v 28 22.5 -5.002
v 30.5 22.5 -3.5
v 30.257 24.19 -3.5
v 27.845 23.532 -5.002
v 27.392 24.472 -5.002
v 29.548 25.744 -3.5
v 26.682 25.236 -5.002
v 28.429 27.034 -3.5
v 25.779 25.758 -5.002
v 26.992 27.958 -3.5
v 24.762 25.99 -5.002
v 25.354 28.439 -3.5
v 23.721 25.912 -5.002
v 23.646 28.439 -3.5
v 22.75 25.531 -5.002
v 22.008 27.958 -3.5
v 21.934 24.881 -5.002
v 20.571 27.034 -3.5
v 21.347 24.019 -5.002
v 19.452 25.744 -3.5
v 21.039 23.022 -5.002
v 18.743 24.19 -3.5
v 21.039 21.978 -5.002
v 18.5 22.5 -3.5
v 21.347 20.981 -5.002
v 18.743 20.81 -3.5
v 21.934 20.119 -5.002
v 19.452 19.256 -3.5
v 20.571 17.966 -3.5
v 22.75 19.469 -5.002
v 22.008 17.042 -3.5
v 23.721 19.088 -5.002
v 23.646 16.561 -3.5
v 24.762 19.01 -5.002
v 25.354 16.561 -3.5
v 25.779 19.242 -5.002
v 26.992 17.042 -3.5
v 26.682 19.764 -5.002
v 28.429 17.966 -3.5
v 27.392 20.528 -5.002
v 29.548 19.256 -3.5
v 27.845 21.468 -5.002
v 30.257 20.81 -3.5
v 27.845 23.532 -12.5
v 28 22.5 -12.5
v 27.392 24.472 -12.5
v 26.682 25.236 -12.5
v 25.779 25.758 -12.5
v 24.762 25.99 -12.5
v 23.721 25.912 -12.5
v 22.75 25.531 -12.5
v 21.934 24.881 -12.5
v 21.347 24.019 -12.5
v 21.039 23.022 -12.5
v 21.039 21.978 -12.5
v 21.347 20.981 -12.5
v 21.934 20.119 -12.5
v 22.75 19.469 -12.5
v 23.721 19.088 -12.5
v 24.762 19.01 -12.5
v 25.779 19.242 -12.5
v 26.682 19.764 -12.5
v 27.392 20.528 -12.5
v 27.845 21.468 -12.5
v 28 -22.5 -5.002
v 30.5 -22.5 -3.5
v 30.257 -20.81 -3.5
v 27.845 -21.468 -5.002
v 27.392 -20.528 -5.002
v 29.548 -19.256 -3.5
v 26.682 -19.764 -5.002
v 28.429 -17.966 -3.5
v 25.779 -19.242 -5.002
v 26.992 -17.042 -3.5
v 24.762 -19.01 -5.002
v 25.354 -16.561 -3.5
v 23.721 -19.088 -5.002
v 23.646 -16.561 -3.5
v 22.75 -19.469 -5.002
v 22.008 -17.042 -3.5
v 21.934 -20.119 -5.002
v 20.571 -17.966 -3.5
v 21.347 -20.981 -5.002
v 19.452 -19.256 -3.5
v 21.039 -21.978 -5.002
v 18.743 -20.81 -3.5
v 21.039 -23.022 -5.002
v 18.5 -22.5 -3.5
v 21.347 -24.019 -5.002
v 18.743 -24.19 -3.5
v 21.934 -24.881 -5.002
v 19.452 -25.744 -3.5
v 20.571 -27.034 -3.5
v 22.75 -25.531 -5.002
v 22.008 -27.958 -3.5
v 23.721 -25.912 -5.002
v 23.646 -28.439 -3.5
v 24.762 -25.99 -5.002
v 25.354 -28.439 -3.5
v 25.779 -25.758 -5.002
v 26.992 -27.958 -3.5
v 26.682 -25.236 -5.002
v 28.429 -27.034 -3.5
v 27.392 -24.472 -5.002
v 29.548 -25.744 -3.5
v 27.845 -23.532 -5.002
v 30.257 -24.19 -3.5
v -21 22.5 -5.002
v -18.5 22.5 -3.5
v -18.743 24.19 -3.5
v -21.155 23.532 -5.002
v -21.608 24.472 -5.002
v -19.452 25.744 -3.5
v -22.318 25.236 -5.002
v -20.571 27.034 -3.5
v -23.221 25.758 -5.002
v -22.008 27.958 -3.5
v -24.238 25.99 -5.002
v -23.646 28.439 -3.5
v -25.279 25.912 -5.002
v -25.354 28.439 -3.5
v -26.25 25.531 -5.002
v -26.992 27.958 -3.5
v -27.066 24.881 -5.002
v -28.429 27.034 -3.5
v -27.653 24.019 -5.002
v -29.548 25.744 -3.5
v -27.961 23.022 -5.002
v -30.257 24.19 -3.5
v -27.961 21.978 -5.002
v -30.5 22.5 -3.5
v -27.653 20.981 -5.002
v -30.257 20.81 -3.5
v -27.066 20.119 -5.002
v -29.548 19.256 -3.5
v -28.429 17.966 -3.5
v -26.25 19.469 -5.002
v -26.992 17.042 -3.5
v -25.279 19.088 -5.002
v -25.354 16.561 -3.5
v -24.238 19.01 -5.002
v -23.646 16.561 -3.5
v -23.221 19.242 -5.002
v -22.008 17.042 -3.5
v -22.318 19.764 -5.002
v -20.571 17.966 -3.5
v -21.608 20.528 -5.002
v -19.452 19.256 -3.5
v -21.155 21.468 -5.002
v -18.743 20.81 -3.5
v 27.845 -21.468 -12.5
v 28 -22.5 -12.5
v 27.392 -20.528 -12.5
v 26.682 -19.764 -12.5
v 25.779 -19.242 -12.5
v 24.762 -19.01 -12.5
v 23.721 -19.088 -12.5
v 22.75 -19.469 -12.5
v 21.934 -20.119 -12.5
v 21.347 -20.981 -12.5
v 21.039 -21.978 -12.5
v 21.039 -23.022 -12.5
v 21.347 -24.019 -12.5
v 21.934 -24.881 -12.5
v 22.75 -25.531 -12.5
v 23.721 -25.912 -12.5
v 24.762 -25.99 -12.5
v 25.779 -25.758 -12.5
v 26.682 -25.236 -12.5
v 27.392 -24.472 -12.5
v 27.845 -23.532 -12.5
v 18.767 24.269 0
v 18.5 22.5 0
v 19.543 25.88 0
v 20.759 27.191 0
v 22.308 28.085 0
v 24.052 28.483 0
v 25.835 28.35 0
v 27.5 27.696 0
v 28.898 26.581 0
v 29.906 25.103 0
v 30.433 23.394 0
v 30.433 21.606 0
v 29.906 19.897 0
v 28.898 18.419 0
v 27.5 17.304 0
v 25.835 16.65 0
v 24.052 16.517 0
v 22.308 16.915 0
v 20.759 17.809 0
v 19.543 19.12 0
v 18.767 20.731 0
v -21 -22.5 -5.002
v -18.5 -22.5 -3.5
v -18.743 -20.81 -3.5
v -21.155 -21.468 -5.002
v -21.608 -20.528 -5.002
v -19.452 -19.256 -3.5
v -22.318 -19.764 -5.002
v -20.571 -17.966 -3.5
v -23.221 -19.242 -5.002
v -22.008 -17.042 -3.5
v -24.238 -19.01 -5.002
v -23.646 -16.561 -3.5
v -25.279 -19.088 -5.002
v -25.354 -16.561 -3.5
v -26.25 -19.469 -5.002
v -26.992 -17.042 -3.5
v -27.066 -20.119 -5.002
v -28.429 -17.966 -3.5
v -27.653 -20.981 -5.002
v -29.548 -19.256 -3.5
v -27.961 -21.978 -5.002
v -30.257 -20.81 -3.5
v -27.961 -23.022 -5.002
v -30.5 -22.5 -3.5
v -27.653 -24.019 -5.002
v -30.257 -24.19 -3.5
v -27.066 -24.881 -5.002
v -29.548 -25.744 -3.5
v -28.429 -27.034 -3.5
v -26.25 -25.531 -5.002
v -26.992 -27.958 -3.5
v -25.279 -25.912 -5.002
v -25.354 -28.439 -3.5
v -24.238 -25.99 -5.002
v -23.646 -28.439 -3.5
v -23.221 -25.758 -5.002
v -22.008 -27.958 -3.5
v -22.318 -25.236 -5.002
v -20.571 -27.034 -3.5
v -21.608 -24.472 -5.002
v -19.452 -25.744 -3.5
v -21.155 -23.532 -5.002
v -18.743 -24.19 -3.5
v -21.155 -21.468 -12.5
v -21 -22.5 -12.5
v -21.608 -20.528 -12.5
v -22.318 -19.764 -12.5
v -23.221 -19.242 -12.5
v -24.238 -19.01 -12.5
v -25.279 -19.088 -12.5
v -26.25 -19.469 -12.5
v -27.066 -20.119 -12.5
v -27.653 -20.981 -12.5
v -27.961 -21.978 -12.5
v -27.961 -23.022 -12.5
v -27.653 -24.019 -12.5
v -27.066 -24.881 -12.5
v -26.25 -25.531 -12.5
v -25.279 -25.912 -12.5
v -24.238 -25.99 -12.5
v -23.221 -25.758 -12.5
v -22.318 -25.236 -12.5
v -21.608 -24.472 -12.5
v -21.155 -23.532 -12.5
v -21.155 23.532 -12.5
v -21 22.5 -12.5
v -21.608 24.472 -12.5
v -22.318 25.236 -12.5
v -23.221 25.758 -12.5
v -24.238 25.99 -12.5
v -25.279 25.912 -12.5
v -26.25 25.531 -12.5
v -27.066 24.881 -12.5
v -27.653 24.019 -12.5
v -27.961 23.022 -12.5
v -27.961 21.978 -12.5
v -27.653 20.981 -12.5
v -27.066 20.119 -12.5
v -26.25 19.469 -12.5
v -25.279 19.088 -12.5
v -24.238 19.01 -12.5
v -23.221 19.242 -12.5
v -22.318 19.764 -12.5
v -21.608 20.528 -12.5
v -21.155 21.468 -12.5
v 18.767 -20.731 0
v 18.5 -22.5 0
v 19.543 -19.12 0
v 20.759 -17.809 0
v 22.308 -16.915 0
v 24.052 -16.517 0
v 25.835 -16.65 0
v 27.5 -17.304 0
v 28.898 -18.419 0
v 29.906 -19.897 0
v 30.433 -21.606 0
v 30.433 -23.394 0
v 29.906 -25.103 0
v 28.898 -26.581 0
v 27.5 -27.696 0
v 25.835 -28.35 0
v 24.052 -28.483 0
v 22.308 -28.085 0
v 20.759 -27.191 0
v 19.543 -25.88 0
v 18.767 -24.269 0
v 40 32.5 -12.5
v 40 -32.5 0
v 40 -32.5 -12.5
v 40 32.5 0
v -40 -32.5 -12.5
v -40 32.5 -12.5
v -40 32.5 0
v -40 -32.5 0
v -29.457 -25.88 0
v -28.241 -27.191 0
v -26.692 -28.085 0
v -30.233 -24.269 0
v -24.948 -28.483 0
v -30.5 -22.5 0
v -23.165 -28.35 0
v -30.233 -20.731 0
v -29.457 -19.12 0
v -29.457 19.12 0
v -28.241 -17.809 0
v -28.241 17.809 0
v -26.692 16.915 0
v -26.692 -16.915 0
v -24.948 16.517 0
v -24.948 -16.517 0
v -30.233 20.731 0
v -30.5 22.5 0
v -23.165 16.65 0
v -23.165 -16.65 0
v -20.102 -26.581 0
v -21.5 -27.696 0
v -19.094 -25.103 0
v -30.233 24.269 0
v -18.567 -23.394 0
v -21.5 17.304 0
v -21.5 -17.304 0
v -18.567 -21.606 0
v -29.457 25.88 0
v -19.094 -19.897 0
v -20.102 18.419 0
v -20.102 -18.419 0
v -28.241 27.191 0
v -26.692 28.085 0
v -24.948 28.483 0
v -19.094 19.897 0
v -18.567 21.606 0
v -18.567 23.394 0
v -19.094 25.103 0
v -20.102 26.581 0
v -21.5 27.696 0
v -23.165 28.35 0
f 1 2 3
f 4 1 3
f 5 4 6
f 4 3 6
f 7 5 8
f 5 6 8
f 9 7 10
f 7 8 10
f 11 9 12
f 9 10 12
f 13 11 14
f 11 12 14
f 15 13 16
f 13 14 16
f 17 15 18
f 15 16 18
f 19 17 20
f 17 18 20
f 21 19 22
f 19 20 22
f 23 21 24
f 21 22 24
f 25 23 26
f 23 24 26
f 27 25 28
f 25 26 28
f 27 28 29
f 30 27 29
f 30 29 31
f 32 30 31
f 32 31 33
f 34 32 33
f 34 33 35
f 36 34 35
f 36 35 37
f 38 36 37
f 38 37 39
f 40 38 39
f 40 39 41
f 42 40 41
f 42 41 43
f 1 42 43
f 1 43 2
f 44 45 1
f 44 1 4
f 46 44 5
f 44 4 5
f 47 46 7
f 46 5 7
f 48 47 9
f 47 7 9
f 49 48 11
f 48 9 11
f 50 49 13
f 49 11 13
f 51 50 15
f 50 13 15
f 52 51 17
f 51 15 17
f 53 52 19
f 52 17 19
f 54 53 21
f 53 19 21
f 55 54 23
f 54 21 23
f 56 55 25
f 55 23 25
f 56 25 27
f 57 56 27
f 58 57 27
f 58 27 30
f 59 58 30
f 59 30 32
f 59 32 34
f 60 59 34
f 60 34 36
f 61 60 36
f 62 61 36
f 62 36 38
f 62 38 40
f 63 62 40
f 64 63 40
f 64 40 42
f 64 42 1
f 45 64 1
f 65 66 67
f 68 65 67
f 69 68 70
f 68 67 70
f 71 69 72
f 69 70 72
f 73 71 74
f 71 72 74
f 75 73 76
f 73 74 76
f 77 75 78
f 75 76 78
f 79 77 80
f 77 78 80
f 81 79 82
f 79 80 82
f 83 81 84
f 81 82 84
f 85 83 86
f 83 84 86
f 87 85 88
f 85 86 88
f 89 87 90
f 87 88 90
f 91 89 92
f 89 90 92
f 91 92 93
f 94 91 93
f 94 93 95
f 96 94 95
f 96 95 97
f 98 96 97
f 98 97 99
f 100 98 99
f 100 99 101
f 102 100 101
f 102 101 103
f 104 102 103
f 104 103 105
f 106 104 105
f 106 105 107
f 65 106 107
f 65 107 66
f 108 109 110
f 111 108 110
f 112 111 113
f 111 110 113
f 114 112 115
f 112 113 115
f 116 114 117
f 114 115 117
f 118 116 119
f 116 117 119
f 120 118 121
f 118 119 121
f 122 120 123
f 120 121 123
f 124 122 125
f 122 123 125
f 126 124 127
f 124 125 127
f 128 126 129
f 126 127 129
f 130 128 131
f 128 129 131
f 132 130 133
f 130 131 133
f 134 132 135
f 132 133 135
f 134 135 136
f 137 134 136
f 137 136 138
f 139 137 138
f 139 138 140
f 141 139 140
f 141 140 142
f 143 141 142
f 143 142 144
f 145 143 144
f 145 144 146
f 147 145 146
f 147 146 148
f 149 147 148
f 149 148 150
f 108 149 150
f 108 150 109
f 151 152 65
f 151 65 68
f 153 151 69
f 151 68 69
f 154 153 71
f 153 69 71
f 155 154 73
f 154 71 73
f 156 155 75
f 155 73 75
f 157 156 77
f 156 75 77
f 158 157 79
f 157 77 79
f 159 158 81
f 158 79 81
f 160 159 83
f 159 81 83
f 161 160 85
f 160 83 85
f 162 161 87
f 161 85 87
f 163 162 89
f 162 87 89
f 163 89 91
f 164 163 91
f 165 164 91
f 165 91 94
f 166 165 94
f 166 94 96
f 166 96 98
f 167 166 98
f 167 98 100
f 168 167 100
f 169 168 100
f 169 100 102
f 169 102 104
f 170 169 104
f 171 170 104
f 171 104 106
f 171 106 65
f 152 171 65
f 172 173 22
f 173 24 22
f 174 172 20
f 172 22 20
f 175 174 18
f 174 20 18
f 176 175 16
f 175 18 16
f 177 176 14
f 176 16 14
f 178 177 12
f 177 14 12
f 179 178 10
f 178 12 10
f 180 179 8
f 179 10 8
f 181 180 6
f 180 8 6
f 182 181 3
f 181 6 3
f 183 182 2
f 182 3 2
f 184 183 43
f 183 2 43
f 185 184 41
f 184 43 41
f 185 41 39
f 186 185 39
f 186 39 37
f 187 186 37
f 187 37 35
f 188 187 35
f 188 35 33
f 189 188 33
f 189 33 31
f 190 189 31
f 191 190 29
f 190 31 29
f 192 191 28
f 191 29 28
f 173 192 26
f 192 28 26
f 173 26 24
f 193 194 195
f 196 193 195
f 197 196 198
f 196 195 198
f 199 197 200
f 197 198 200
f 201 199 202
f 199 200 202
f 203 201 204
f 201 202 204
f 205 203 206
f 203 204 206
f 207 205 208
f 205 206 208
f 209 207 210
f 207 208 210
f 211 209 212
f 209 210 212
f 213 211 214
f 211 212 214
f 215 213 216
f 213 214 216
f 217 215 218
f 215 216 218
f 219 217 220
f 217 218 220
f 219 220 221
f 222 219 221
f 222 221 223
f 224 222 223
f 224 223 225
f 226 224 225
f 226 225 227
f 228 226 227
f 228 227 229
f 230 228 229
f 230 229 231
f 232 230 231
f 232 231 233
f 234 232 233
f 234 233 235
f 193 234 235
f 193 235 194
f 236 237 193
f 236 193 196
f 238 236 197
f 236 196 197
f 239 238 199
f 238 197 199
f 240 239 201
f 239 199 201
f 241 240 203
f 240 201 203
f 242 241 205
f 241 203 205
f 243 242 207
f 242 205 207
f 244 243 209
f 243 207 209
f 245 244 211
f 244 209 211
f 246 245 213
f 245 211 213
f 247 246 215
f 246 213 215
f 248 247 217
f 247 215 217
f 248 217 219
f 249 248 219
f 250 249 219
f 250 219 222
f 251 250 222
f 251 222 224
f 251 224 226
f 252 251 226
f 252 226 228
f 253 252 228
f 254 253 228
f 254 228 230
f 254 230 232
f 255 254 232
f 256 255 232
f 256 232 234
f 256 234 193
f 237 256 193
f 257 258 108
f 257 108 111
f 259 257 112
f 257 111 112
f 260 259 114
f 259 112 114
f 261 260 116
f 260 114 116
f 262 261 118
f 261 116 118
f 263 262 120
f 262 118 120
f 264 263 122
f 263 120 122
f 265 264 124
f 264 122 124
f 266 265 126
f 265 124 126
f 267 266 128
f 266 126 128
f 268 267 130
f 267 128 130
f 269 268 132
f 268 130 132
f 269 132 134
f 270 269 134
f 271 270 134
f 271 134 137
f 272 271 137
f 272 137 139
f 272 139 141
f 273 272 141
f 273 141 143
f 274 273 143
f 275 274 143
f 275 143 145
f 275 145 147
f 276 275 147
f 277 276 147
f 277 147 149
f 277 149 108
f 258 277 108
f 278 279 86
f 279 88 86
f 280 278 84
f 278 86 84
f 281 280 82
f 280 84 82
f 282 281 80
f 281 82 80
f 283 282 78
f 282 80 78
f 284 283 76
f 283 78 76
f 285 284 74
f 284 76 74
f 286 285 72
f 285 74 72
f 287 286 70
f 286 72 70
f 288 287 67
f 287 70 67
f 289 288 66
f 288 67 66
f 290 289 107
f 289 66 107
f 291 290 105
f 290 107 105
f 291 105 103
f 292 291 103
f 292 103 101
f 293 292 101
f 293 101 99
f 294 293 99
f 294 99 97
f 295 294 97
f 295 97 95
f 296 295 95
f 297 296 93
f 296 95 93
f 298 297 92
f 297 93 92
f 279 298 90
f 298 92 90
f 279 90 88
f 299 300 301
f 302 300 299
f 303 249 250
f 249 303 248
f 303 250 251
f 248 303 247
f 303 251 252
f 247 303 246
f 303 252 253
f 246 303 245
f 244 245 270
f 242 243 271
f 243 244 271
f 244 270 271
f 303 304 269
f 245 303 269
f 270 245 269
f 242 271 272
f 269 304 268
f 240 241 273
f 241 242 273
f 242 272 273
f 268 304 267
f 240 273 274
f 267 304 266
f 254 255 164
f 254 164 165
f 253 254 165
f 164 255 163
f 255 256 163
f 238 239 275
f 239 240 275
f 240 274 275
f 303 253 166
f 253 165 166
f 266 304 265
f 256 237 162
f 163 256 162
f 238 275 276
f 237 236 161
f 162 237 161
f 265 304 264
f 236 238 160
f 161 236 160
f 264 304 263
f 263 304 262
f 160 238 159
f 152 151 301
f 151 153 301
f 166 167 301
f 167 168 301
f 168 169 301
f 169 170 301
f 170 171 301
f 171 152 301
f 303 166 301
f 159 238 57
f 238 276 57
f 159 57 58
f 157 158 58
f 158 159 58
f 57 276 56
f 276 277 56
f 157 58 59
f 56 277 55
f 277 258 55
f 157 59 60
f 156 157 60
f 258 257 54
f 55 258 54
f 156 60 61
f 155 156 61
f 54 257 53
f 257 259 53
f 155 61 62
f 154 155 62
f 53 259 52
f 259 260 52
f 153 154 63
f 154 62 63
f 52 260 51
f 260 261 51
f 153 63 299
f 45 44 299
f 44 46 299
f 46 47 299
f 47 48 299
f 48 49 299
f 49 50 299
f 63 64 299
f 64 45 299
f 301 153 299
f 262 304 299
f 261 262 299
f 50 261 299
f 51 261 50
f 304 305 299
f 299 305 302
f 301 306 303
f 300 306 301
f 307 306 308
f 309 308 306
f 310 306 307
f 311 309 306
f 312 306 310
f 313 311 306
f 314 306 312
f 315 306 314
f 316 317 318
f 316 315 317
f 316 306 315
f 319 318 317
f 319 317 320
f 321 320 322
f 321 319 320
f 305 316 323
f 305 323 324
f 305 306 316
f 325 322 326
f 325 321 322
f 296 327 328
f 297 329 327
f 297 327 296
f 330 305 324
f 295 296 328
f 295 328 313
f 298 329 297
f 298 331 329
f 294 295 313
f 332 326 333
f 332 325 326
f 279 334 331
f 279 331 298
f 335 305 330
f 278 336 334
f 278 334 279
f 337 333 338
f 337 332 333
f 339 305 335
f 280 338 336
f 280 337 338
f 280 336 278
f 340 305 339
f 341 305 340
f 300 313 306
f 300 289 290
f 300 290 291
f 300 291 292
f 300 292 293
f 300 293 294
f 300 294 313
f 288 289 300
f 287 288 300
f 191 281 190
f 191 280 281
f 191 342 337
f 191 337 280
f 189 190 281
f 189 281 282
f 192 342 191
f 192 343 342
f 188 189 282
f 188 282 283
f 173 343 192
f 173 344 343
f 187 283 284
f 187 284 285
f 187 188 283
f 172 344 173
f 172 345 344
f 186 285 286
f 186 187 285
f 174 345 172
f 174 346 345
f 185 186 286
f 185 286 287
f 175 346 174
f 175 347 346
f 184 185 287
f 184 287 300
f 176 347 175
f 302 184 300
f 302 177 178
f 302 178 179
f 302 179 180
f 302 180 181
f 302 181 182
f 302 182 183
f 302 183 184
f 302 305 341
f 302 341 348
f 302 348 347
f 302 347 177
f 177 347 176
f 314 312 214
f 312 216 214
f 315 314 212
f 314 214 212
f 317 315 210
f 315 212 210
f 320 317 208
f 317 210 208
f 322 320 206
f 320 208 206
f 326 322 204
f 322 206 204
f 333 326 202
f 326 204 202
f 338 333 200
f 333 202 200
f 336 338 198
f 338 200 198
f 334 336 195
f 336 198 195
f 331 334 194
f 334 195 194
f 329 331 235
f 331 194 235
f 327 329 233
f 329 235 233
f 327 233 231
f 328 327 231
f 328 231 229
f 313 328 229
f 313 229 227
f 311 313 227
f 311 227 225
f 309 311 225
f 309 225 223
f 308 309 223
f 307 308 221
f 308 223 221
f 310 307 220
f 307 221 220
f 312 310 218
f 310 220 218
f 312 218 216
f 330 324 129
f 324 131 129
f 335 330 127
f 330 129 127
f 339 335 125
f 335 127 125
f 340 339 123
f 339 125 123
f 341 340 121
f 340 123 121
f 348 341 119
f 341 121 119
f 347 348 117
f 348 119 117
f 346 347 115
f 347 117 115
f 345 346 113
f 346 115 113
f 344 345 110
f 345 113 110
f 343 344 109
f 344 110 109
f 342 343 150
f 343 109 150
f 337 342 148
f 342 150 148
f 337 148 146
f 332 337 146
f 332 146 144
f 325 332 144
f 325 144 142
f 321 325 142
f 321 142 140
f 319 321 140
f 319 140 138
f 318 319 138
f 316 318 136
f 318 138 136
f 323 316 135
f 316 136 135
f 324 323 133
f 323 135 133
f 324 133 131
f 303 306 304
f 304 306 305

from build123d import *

# Parameters (mm, degrees)
F0_W     = 79.99999748
F0_H     = 64.99999954
F0_R     = 3.49999935
F1_DEPTH = 12.49999786
F2_D     = 11.99999886
F2_DEPTH = 3.49999808
F2_TIP   = 3.6051633717


with BuildPart() as f1:
    # F0 (on Top) → F1 (new body)
    with BuildSketch(Plane.XY):
        Rectangle(F0_W, F0_H)
        with Locations((-24.49999926, -22.49999818)):
            Circle(F0_R, mode=Mode.SUBTRACT)
        with Locations((24.49999926, -22.49999818)):
            Circle(F0_R, mode=Mode.SUBTRACT)
        with Locations((-24.49999926, 22.49999818)):
            Circle(F0_R, mode=Mode.SUBTRACT)
        with Locations((24.49999926, 22.49999818)):
            Circle(F0_R, mode=Mode.SUBTRACT)
    extrude(amount=-F1_DEPTH)

    # F2
    with Locations(Plane.XY):
        with Locations((24.49999926, -22.49999818), (-24.49999926, -22.49999818), (-24.49999926, 22.49999818), (24.49999926, 22.49999818)):
            Hole(F2_D / 2, depth=F2_DEPTH)
            with Locations((0, 0, -(F2_DEPTH + F2_TIP / 2))):  # 118° drill point
                Cone(0, F2_D / 2, F2_TIP, mode=Mode.SUBTRACT)


solid = f1.part
